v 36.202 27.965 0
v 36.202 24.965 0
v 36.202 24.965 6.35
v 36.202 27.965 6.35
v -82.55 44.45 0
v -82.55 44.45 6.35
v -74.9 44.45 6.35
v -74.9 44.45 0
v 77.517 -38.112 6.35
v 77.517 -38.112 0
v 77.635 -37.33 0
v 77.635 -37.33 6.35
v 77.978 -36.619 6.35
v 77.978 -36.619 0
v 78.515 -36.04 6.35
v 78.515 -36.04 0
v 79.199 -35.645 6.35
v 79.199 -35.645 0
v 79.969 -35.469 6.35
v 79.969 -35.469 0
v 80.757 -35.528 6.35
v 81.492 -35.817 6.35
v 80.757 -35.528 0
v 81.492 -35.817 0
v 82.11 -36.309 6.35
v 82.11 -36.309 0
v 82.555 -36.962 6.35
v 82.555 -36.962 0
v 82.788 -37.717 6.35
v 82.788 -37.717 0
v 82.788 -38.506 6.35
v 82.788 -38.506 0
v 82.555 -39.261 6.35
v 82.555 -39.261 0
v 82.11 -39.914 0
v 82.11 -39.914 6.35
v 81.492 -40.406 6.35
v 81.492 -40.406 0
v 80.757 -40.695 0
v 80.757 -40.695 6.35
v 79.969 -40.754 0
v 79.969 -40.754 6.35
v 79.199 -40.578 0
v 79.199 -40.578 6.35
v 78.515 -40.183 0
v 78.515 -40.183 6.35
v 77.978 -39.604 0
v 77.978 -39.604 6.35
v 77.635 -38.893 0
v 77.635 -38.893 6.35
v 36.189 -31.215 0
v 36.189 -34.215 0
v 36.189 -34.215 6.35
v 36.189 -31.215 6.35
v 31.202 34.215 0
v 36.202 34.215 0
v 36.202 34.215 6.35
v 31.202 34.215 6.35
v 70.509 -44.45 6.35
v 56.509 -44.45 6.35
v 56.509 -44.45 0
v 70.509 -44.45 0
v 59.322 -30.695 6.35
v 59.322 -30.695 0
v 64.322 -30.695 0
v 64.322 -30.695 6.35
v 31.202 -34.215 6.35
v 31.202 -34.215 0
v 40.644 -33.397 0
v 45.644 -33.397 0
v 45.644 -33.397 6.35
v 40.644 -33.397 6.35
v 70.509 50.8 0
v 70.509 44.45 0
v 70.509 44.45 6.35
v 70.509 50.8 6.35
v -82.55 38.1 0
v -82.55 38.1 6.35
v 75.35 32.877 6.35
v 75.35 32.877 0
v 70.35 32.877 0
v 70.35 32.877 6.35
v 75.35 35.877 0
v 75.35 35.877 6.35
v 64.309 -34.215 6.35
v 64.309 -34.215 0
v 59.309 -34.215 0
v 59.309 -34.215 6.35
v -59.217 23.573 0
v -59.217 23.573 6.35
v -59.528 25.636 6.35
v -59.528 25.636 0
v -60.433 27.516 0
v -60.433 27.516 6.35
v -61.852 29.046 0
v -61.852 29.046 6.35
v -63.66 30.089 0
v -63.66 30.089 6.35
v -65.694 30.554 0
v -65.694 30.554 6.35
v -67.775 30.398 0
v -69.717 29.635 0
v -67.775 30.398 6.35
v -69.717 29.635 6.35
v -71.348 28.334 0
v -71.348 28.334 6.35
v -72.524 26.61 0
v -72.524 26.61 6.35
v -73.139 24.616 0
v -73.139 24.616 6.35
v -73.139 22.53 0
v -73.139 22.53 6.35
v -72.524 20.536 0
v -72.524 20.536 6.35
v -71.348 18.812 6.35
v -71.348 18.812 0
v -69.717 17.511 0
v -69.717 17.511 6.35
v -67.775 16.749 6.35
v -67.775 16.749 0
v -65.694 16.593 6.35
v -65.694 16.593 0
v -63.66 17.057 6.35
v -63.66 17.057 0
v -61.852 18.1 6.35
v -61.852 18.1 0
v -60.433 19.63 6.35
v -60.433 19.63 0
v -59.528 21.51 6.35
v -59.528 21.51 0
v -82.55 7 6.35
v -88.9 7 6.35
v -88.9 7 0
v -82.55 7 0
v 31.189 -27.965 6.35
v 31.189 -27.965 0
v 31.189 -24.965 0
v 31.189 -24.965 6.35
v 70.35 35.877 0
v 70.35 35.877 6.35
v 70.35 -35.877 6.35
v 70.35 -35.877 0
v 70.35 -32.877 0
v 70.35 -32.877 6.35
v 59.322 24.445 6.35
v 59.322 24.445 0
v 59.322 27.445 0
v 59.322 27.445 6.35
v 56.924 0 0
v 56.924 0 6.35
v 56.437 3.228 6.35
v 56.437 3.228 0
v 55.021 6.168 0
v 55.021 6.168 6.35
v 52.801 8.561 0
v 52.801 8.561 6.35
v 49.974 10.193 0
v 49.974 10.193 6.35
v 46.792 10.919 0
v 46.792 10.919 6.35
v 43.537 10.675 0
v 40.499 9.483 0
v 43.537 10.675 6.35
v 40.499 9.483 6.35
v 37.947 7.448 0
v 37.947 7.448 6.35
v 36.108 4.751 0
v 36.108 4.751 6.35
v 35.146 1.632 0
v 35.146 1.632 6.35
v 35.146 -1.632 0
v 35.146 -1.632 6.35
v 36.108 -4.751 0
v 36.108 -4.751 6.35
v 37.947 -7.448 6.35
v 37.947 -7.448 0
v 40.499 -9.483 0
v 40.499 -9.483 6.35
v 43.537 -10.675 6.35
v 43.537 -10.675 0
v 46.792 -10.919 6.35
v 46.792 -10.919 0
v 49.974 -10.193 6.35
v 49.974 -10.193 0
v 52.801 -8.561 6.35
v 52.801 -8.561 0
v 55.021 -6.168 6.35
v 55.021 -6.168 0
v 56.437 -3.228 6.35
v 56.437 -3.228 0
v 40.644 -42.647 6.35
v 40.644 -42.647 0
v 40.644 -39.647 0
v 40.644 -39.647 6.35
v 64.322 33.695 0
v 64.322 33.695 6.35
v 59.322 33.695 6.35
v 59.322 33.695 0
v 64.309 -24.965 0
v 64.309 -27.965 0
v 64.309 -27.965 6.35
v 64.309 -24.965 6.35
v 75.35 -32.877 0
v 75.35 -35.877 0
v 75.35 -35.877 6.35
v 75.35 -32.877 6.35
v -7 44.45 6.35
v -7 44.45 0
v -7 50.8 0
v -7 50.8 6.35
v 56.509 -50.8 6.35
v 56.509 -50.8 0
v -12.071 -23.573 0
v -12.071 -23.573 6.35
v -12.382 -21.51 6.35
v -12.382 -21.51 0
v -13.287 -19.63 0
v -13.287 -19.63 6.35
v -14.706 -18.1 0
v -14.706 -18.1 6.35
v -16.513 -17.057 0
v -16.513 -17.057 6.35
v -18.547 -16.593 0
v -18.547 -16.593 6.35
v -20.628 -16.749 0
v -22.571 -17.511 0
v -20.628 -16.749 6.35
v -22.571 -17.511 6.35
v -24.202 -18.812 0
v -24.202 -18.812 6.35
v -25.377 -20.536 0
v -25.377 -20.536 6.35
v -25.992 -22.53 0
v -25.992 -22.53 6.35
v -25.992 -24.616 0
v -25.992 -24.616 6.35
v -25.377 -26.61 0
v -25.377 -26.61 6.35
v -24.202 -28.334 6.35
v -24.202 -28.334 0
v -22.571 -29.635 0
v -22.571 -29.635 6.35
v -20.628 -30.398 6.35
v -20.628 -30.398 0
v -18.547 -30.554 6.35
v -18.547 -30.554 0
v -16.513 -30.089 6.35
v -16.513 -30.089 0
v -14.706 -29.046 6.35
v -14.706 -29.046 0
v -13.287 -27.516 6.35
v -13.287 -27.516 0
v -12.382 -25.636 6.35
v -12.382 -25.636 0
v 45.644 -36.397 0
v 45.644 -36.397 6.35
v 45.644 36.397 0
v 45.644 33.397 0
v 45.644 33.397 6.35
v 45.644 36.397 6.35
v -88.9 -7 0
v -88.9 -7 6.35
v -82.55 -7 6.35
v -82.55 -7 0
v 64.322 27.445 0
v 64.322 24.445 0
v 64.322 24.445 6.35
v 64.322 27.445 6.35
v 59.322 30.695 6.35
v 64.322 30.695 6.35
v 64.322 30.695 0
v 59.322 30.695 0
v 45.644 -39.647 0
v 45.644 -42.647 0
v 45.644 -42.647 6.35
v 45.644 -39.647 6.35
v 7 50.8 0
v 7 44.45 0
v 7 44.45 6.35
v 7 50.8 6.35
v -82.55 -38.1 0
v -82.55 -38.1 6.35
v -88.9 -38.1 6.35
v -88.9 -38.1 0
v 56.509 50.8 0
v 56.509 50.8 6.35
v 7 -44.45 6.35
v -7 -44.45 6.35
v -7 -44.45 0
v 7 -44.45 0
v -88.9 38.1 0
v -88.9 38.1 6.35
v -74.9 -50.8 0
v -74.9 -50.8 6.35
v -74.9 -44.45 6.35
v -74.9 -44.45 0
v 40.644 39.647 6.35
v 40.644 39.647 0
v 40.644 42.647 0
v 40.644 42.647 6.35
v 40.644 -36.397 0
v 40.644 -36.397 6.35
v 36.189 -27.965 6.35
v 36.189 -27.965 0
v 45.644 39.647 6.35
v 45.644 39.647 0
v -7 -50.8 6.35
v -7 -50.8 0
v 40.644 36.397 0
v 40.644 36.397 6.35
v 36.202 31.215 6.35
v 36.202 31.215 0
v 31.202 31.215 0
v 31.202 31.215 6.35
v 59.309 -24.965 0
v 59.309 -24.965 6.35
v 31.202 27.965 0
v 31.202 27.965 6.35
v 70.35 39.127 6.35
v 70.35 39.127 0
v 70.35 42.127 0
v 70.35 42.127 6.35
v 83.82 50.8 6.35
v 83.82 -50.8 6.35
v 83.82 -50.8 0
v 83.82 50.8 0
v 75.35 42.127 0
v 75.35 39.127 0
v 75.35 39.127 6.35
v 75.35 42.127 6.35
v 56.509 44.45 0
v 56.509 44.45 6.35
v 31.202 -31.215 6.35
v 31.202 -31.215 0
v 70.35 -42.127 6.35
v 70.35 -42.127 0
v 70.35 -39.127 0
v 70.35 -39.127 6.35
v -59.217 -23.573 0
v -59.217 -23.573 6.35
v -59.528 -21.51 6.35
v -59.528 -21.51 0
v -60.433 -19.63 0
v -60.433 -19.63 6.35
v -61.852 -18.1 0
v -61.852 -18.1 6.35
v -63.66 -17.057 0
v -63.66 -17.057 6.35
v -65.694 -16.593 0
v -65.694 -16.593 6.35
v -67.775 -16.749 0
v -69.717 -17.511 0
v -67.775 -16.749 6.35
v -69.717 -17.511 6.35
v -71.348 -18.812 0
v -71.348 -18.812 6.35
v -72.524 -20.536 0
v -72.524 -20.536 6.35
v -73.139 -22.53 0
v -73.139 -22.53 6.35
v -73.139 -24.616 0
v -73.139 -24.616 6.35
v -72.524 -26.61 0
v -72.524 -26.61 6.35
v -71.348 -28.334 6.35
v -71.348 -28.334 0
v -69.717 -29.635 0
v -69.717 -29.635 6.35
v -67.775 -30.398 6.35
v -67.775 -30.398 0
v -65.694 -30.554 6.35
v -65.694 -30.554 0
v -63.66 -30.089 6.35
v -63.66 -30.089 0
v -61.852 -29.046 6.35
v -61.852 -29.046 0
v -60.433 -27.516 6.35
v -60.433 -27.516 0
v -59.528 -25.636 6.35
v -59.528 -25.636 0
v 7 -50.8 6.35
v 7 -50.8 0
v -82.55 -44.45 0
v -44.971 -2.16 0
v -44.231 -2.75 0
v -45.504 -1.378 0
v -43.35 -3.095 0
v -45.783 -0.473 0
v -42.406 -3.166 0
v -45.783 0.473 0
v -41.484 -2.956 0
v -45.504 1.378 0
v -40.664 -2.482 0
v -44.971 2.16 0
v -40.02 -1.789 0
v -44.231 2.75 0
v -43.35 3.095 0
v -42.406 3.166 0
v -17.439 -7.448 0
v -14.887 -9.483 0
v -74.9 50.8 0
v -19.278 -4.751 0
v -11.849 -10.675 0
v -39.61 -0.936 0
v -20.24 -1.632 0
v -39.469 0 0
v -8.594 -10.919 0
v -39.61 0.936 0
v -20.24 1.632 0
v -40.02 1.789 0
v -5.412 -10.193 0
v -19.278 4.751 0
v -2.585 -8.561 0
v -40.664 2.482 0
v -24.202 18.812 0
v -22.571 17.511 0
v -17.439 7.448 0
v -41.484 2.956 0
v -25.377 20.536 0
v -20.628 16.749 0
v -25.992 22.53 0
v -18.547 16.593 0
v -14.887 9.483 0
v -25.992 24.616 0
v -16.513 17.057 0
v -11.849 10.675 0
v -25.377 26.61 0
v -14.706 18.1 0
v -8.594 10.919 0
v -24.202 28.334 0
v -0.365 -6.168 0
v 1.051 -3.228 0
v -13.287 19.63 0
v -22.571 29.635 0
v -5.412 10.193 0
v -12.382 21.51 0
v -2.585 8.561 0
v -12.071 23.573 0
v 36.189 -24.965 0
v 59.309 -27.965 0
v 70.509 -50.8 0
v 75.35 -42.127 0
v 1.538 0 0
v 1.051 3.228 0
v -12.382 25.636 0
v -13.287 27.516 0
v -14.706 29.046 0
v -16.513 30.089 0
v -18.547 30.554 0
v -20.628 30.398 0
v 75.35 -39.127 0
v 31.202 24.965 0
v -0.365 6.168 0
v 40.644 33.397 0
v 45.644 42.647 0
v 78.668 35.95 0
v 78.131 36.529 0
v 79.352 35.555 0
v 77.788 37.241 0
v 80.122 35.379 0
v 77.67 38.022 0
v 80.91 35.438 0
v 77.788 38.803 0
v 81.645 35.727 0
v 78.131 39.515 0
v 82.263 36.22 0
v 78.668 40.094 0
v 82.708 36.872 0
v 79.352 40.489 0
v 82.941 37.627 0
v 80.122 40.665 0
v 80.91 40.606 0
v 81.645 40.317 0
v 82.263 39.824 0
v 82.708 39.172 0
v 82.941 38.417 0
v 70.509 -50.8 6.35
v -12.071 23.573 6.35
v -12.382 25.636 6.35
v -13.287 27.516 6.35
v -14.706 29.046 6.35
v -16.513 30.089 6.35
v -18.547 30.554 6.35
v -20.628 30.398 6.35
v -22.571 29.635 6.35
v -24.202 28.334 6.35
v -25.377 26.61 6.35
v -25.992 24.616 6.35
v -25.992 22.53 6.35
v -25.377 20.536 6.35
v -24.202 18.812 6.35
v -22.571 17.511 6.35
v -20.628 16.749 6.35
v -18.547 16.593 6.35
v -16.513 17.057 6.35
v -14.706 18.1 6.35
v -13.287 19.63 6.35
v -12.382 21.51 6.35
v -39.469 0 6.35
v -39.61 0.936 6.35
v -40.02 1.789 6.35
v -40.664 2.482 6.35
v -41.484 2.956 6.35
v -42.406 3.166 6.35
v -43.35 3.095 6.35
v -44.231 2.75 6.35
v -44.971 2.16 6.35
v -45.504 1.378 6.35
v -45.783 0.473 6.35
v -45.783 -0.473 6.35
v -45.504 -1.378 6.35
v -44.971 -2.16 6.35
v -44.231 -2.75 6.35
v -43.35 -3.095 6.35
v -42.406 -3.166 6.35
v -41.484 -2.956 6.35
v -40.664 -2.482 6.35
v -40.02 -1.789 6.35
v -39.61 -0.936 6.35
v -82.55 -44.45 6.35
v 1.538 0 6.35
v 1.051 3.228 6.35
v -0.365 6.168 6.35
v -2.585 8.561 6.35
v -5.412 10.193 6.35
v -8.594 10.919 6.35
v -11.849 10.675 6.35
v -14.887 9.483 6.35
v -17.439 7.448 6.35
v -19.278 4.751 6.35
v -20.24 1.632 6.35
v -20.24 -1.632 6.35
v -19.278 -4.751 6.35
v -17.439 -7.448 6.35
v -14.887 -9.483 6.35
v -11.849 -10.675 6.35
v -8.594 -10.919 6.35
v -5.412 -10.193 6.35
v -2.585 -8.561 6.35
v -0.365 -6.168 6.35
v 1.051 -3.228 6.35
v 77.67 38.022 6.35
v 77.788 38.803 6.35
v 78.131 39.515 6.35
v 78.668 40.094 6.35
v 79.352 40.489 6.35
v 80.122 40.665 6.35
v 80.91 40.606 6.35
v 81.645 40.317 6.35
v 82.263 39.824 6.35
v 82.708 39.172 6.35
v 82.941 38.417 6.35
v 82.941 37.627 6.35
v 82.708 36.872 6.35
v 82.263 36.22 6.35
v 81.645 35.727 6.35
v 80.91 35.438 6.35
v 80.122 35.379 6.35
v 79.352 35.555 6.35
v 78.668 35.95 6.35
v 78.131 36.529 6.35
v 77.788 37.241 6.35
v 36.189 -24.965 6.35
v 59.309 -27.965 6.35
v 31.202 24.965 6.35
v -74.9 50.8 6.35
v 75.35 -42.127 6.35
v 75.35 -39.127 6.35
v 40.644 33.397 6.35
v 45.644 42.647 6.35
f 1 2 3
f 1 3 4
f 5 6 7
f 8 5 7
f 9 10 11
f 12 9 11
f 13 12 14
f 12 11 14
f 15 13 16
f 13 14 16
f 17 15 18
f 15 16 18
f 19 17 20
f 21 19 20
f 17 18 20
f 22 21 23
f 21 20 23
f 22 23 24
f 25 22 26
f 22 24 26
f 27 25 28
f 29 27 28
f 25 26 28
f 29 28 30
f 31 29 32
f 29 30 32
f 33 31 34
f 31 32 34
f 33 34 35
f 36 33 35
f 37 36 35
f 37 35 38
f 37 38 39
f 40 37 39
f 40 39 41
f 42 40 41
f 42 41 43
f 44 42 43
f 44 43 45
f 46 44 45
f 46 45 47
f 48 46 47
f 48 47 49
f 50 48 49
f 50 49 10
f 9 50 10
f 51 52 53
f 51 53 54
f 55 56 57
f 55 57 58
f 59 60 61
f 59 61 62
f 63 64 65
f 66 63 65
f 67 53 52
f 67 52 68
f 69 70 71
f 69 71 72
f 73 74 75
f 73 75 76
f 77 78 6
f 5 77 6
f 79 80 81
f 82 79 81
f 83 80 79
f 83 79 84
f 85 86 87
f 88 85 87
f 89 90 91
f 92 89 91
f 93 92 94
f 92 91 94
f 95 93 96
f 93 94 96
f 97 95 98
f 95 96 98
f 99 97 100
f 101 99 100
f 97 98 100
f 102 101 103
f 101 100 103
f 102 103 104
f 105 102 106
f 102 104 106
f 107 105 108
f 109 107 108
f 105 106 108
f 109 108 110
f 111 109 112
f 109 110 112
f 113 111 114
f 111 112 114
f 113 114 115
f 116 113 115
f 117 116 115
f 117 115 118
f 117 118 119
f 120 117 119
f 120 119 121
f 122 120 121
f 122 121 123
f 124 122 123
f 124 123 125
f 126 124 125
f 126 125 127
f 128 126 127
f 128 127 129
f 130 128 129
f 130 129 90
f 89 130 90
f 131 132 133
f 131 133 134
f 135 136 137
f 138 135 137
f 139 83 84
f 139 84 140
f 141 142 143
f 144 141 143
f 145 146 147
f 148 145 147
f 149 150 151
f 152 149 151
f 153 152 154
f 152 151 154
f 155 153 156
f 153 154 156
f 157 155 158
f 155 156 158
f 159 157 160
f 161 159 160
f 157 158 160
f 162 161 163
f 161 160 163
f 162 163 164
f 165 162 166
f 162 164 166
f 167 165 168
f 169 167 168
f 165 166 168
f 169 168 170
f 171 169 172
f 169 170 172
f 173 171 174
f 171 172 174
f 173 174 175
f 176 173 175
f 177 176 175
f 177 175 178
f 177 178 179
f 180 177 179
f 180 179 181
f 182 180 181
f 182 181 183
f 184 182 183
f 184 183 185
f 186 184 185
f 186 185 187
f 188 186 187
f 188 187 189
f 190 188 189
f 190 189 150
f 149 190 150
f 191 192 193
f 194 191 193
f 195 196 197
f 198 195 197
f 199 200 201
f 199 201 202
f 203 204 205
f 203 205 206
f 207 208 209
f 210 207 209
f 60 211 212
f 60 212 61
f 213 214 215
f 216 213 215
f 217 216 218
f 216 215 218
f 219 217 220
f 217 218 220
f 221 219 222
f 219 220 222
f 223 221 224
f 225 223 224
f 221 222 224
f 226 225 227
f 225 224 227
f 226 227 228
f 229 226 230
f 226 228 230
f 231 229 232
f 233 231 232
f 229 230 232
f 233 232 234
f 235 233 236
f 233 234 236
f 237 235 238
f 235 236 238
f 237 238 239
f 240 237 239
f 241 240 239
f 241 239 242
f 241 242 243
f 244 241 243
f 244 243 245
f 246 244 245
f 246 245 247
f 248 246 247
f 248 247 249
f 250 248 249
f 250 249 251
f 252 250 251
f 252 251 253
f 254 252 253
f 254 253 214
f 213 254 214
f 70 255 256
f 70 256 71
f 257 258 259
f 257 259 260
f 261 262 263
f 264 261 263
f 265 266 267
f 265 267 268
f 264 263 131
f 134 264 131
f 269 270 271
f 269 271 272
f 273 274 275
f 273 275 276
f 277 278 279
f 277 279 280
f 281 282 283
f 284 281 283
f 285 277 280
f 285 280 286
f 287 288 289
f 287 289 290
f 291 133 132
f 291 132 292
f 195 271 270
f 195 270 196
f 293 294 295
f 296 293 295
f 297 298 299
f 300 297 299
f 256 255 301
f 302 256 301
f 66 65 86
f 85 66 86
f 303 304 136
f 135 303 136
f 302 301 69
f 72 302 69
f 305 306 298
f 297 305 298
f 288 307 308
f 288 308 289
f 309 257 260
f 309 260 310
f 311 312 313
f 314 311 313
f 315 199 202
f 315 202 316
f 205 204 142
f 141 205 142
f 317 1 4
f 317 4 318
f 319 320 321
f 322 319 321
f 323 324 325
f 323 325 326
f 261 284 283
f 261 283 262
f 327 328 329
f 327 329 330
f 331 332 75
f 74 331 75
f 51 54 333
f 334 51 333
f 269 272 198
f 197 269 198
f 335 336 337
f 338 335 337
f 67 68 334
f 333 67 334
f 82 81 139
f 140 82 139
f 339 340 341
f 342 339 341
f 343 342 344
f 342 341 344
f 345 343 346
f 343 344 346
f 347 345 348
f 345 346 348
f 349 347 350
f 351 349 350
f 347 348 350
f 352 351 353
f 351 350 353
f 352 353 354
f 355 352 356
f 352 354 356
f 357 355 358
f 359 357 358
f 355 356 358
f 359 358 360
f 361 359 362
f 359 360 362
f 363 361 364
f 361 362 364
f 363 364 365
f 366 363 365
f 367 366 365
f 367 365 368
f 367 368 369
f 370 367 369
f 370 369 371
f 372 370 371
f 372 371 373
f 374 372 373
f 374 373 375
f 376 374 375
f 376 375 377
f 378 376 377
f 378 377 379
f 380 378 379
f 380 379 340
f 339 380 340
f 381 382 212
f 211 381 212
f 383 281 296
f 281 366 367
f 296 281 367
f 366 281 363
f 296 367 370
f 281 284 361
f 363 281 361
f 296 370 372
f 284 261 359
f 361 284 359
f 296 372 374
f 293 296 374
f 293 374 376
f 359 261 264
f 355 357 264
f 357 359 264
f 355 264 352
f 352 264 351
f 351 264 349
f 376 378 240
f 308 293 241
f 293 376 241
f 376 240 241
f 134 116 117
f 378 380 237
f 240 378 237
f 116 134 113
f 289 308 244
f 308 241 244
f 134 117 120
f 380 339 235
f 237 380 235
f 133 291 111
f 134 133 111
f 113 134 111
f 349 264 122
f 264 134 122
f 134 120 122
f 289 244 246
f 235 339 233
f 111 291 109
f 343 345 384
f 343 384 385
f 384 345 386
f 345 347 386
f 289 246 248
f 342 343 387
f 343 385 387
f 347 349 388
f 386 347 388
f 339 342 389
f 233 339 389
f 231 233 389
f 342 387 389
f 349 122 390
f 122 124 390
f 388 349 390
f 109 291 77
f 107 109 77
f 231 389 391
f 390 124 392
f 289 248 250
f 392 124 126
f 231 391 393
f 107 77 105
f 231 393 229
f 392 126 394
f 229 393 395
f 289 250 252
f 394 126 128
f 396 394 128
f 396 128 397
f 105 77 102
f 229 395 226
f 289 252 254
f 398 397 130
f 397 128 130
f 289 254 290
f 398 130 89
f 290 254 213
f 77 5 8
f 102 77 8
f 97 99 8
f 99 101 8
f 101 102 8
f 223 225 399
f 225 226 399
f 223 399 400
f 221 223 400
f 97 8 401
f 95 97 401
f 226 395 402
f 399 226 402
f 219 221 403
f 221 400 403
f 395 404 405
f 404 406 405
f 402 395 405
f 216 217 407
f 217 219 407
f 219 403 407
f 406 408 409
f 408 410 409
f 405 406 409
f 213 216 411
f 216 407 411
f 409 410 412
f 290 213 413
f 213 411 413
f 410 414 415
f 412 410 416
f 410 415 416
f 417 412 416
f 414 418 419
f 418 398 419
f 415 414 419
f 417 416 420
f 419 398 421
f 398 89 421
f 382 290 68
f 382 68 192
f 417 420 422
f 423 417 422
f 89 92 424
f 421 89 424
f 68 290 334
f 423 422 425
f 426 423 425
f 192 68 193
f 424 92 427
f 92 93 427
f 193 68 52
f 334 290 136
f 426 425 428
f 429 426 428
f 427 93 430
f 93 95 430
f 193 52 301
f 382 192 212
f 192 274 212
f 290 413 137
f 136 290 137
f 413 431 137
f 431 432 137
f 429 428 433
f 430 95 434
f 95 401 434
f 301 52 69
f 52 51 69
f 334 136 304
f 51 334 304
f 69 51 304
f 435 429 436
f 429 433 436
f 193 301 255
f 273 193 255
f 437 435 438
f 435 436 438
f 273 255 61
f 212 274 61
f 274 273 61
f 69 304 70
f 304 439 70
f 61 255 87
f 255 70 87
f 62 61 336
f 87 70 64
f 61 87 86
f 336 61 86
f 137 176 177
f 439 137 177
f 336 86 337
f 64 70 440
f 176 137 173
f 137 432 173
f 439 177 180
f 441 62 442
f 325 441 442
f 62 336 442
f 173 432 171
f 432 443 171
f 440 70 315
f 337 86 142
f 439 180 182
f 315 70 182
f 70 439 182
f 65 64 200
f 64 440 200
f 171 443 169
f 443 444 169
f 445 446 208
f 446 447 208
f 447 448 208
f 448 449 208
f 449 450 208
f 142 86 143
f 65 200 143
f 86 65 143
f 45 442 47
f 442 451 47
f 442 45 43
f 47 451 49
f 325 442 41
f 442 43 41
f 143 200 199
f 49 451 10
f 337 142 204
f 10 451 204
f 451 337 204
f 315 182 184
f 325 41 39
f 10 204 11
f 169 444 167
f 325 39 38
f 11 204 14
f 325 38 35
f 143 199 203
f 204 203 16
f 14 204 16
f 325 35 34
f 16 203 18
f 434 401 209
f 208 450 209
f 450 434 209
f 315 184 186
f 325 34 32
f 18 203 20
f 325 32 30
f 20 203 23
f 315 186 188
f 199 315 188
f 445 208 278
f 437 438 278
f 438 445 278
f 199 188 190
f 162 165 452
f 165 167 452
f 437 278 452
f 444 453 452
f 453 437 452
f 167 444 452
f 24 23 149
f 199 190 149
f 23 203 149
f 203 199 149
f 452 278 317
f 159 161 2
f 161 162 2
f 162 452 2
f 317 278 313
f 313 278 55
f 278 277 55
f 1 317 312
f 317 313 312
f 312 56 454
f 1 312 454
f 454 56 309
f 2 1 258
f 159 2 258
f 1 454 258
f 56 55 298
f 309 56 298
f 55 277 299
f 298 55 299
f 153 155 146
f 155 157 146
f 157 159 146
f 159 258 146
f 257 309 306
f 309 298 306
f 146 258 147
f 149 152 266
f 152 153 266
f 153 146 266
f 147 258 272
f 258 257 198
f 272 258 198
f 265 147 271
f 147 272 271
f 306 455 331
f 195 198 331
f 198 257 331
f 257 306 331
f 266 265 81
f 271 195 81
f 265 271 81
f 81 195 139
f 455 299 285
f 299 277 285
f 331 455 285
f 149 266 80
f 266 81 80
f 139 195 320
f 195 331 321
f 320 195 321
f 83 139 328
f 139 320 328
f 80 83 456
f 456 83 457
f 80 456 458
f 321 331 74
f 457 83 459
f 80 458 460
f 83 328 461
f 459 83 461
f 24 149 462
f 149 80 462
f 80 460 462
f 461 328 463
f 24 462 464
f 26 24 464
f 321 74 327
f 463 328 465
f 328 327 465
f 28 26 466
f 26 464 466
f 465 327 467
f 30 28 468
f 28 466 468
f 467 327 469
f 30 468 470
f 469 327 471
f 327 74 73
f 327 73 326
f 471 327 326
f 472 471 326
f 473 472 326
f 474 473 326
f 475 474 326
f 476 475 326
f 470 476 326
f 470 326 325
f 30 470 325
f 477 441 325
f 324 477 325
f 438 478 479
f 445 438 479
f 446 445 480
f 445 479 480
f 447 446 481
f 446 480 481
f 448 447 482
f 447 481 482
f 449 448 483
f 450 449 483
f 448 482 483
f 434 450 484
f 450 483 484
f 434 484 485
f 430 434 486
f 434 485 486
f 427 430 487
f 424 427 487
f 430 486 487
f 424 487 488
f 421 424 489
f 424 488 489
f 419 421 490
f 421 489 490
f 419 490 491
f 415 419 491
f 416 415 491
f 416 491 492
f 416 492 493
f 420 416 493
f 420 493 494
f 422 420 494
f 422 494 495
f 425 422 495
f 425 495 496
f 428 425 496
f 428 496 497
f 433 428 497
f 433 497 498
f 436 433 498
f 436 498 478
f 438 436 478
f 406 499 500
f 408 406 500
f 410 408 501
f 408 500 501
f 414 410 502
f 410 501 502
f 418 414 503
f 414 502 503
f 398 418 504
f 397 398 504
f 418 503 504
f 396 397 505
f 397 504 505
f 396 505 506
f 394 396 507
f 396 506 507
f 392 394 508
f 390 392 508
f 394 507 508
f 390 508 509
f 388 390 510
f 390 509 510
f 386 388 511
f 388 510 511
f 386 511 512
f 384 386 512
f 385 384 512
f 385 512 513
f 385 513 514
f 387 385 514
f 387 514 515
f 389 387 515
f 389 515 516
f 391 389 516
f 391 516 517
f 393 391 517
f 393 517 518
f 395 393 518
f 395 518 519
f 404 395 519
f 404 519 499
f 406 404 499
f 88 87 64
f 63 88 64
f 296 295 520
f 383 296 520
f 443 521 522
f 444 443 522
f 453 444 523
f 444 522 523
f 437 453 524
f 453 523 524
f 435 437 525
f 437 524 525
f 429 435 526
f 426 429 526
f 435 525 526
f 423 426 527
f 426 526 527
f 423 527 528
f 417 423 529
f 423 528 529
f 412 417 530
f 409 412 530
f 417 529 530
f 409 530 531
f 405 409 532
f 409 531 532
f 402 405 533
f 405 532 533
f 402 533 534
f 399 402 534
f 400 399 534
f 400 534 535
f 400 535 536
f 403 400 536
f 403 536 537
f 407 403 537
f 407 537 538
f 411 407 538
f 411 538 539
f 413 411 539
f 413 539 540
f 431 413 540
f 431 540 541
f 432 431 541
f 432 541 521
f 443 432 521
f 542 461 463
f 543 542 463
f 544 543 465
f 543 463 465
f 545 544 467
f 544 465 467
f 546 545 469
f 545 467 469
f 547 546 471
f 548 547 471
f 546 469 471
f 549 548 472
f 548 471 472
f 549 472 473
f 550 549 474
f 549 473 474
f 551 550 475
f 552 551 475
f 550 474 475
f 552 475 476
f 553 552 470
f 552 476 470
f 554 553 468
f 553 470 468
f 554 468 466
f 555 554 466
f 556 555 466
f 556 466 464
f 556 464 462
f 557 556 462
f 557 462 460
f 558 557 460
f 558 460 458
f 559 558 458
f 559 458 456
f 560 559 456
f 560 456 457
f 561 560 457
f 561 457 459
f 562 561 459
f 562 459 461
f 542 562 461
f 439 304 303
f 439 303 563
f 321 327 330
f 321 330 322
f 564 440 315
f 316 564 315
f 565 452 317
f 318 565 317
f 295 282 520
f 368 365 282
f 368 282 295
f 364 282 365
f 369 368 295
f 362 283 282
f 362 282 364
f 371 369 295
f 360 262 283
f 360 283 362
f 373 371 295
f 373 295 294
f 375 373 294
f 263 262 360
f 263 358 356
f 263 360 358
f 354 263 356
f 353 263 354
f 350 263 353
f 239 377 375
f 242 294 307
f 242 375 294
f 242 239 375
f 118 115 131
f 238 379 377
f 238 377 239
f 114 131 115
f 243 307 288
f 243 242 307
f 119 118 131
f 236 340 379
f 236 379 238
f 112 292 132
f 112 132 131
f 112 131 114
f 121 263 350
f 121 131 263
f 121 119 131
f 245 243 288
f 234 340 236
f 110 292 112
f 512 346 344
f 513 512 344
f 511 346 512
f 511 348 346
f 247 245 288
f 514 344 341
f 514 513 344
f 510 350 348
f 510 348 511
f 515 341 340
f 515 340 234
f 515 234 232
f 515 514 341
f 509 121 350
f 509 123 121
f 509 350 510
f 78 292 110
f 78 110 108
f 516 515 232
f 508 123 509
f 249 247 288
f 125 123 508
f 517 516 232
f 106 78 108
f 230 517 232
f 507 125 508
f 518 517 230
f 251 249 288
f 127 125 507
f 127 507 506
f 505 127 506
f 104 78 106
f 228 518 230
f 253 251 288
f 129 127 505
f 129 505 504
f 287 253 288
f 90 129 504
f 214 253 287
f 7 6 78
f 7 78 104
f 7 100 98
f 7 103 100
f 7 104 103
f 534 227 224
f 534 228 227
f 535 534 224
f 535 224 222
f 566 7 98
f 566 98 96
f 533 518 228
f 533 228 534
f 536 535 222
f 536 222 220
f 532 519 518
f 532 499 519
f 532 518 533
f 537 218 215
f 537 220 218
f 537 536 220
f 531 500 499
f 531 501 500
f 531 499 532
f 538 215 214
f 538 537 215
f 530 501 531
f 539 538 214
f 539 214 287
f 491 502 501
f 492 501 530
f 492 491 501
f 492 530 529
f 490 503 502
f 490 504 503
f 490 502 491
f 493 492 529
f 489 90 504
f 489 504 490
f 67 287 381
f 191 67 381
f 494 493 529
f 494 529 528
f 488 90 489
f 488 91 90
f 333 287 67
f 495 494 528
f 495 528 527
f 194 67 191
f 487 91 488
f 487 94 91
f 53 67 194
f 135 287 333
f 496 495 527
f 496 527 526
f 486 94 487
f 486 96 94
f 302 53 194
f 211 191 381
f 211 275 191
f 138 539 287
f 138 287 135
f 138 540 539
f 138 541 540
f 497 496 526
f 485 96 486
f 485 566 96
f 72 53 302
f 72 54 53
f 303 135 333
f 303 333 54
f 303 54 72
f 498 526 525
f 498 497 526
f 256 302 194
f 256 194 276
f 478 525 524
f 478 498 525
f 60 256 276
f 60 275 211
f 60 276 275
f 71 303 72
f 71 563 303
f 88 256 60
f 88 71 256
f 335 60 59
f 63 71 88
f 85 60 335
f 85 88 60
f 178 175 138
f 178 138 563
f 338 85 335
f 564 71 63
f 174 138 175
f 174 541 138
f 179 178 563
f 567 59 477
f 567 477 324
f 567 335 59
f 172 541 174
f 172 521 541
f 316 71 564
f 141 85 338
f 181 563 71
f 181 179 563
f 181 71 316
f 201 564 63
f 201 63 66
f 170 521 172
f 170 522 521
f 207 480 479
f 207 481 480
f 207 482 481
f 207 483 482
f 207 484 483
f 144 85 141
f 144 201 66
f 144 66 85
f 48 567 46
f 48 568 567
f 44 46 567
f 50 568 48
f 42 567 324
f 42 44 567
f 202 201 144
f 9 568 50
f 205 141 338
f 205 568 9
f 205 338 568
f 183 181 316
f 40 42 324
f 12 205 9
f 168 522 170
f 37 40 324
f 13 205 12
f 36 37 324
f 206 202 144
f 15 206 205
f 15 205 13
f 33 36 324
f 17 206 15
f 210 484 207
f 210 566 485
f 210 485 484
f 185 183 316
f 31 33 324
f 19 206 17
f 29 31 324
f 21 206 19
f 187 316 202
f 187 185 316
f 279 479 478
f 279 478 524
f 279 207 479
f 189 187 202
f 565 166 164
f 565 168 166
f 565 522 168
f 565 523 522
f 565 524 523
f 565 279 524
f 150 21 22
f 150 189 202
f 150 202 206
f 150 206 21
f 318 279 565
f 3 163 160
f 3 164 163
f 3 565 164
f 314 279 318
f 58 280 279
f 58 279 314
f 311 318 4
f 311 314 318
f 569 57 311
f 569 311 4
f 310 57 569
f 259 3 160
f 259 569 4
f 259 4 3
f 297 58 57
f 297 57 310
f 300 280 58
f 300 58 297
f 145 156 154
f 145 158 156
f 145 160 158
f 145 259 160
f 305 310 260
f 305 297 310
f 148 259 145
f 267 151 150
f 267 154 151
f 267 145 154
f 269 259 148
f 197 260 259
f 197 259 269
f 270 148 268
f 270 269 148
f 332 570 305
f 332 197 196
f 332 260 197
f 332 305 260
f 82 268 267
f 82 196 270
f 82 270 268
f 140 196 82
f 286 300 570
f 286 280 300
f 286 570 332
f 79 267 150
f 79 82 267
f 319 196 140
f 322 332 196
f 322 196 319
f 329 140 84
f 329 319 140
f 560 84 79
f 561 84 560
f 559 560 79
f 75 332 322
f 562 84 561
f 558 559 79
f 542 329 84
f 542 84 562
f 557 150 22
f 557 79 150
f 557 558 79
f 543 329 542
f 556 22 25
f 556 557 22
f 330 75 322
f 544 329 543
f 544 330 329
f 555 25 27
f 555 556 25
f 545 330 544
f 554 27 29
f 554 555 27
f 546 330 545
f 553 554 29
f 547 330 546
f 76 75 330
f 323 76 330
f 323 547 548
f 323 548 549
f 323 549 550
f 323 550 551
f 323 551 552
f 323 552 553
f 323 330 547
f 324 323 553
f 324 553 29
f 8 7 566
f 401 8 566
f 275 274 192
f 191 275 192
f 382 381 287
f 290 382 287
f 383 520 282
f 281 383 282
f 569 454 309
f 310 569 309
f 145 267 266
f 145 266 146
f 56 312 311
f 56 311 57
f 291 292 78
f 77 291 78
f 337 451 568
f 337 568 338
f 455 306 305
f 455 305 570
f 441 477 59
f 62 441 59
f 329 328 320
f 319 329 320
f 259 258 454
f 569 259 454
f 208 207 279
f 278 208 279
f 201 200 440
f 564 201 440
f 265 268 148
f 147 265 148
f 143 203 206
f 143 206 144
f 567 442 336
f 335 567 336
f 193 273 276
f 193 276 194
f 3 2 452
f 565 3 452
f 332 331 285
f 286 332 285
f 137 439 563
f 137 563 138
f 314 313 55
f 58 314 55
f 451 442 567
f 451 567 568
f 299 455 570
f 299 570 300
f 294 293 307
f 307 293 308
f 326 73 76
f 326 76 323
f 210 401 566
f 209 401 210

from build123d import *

# Parameters (mm, degrees)
SKETCH2_W           = 177.8
SKETCH2_H           = 101.6
BOSS_EXTRUDE3_DEPTH = 6.35
SKETCH3_R           = 10.95
SKETCH3_R_2         = 3.175
SKETCH3_R_3         = 7
CUT_EXTRUDE1_DEPTH  = 103.587389576
SKETCH7_W           = 14
SKETCH7_H           = 6.35
SKETCH7_W_2         = 6.35
SKETCH7_H_2         = 14
SKETCH7_W_3         = 5.08
SKETCH7_H_3         = 101.6
CUT_EXTRUDE2_DEPTH  = 103.587389576
SKETCH8_W           = 5
SKETCH8_H           = 3
SKETCH8_W_2         = 4.987190998
SKETCH8_R           = 2.65
CUT_EXTRUDE3_DEPTH  = 103.587389576


with BuildPart() as part:
    # Sketch2 → Boss-Extrude3 (new body)
    with BuildSketch(Plane.XY):
        Rectangle(SKETCH2_W, SKETCH2_H)
    extrude(amount=BOSS_EXTRUDE3_DEPTH)

    # Sketch3 → Cut-Extrude1 (cut, through all)
    with BuildSketch(Plane.XY.offset(6.35)):
        with Locations((-9.4120506, 0)):
            Circle(SKETCH3_R)
        with Locations((-42.64375, 0)):
            Circle(SKETCH3_R_2)
        with Locations((-66.216922318, 23.573172318)):
            Circle(SKETCH3_R_3)
        with Locations((-19.070577682, 23.573172318)):
            Circle(SKETCH3_R_3)
        with Locations((-66.216922318, -23.573172318)):
            Circle(SKETCH3_R_3)
        with Locations((-19.070577682, -23.573172318)):
            Circle(SKETCH3_R_3)
        with Locations((45.9739194, 0)):
            Circle(SKETCH3_R)
    extrude(amount=-CUT_EXTRUDE1_DEPTH, mode=Mode.SUBTRACT)

    # Sketch7 → Cut-Extrude2 (cut, through all)
    with BuildSketch(Plane.XY.offset(6.35)):
        with Locations((63.509, -47.625)):
            Rectangle(SKETCH7_W, SKETCH7_H)
        with Locations((63.509, 47.625)):
            Rectangle(SKETCH7_W, SKETCH7_H)
        with Locations((0, 47.625)):
            Rectangle(SKETCH7_W, SKETCH7_H)
        with Locations((0, -47.625)):
            Rectangle(SKETCH7_W, SKETCH7_H)
        Polygon((-82.55, -38.1), (-88.9, -38.1), (-88.9, -44.45), (-88.9, -50.8), (-74.9, -50.8), (-74.9, -44.45), (-82.55, -44.45), align=None)
        with Locations((-85.725, 0)):
            Rectangle(SKETCH7_W_2, SKETCH7_H_2)
        Polygon((-88.9, 44.45), (-88.9, 38.1), (-82.55, 38.1), (-82.55, 44.45), (-74.9, 44.45), (-74.9, 50.8), (-88.9, 50.8), align=None)
        with Locations((86.36, 0)):
            Rectangle(SKETCH7_W_3, SKETCH7_H_3)
    extrude(amount=-CUT_EXTRUDE2_DEPTH, mode=Mode.SUBTRACT)

    # Sketch8 → Cut-Extrude3 (cut, through all)
    with BuildSketch(Plane(origin=(0, 0, 0), x_dir=(-1, 0, 0), z_dir=(0, 0, -1))):
        with Locations((-61.809, -26.465)):
            Rectangle(SKETCH8_W, SKETCH8_H)
        Polygon((-59.321809002, -30.694855507), (-64.321809002, -30.694855507), (-64.309, -34.215), (-59.309, -34.215), align=None)
        with Locations((-33.689, -26.465)):
            Rectangle(SKETCH8_W, SKETCH8_H)
        with Locations((-43.143748621, -41.147)):
            Rectangle(SKETCH8_W, SKETCH8_H)
        with Locations((-43.143748621, -34.897)):
            Rectangle(SKETCH8_W, SKETCH8_H)
        with Locations((-33.695404501, -32.715)):
            Rectangle(SKETCH8_W_2, SKETCH8_H)
        with Locations((-43.143748621, 41.147)):
            Rectangle(SKETCH8_W, SKETCH8_H)
        with Locations((-43.143748621, 34.897)):
            Rectangle(SKETCH8_W, SKETCH8_H)
        with Locations((-33.701809002, 32.715)):
            Rectangle(SKETCH8_W, SKETCH8_H)
        with Locations((-33.701809002, 26.465)):
            Rectangle(SKETCH8_W, SKETCH8_H)
        with Locations((-72.850352522, 40.626855507)):
            Rectangle(SKETCH8_W, SKETCH8_H)
        with Locations((-72.850352522, 34.376855507)):
            Rectangle(SKETCH8_W, SKETCH8_H)
        with Locations((-61.821809002, 32.194855507)):
            Rectangle(SKETCH8_W, SKETCH8_H)
        with Locations((-61.821809002, 25.944855507)):
            Rectangle(SKETCH8_W, SKETCH8_H)
        with Locations((-72.850352522, -34.376855507)):
            Rectangle(SKETCH8_W, SKETCH8_H)
        with Locations((-72.850352522, -40.626855507)):
            Rectangle(SKETCH8_W, SKETCH8_H)
        with Locations((-80.320280368, 38.022017825)):
            Circle(SKETCH8_R)
        with Locations((-80.167417552, -38.111532033)):
            Circle(SKETCH8_R)
    extrude(amount=-CUT_EXTRUDE3_DEPTH, mode=Mode.SUBTRACT)


solid = part.part
